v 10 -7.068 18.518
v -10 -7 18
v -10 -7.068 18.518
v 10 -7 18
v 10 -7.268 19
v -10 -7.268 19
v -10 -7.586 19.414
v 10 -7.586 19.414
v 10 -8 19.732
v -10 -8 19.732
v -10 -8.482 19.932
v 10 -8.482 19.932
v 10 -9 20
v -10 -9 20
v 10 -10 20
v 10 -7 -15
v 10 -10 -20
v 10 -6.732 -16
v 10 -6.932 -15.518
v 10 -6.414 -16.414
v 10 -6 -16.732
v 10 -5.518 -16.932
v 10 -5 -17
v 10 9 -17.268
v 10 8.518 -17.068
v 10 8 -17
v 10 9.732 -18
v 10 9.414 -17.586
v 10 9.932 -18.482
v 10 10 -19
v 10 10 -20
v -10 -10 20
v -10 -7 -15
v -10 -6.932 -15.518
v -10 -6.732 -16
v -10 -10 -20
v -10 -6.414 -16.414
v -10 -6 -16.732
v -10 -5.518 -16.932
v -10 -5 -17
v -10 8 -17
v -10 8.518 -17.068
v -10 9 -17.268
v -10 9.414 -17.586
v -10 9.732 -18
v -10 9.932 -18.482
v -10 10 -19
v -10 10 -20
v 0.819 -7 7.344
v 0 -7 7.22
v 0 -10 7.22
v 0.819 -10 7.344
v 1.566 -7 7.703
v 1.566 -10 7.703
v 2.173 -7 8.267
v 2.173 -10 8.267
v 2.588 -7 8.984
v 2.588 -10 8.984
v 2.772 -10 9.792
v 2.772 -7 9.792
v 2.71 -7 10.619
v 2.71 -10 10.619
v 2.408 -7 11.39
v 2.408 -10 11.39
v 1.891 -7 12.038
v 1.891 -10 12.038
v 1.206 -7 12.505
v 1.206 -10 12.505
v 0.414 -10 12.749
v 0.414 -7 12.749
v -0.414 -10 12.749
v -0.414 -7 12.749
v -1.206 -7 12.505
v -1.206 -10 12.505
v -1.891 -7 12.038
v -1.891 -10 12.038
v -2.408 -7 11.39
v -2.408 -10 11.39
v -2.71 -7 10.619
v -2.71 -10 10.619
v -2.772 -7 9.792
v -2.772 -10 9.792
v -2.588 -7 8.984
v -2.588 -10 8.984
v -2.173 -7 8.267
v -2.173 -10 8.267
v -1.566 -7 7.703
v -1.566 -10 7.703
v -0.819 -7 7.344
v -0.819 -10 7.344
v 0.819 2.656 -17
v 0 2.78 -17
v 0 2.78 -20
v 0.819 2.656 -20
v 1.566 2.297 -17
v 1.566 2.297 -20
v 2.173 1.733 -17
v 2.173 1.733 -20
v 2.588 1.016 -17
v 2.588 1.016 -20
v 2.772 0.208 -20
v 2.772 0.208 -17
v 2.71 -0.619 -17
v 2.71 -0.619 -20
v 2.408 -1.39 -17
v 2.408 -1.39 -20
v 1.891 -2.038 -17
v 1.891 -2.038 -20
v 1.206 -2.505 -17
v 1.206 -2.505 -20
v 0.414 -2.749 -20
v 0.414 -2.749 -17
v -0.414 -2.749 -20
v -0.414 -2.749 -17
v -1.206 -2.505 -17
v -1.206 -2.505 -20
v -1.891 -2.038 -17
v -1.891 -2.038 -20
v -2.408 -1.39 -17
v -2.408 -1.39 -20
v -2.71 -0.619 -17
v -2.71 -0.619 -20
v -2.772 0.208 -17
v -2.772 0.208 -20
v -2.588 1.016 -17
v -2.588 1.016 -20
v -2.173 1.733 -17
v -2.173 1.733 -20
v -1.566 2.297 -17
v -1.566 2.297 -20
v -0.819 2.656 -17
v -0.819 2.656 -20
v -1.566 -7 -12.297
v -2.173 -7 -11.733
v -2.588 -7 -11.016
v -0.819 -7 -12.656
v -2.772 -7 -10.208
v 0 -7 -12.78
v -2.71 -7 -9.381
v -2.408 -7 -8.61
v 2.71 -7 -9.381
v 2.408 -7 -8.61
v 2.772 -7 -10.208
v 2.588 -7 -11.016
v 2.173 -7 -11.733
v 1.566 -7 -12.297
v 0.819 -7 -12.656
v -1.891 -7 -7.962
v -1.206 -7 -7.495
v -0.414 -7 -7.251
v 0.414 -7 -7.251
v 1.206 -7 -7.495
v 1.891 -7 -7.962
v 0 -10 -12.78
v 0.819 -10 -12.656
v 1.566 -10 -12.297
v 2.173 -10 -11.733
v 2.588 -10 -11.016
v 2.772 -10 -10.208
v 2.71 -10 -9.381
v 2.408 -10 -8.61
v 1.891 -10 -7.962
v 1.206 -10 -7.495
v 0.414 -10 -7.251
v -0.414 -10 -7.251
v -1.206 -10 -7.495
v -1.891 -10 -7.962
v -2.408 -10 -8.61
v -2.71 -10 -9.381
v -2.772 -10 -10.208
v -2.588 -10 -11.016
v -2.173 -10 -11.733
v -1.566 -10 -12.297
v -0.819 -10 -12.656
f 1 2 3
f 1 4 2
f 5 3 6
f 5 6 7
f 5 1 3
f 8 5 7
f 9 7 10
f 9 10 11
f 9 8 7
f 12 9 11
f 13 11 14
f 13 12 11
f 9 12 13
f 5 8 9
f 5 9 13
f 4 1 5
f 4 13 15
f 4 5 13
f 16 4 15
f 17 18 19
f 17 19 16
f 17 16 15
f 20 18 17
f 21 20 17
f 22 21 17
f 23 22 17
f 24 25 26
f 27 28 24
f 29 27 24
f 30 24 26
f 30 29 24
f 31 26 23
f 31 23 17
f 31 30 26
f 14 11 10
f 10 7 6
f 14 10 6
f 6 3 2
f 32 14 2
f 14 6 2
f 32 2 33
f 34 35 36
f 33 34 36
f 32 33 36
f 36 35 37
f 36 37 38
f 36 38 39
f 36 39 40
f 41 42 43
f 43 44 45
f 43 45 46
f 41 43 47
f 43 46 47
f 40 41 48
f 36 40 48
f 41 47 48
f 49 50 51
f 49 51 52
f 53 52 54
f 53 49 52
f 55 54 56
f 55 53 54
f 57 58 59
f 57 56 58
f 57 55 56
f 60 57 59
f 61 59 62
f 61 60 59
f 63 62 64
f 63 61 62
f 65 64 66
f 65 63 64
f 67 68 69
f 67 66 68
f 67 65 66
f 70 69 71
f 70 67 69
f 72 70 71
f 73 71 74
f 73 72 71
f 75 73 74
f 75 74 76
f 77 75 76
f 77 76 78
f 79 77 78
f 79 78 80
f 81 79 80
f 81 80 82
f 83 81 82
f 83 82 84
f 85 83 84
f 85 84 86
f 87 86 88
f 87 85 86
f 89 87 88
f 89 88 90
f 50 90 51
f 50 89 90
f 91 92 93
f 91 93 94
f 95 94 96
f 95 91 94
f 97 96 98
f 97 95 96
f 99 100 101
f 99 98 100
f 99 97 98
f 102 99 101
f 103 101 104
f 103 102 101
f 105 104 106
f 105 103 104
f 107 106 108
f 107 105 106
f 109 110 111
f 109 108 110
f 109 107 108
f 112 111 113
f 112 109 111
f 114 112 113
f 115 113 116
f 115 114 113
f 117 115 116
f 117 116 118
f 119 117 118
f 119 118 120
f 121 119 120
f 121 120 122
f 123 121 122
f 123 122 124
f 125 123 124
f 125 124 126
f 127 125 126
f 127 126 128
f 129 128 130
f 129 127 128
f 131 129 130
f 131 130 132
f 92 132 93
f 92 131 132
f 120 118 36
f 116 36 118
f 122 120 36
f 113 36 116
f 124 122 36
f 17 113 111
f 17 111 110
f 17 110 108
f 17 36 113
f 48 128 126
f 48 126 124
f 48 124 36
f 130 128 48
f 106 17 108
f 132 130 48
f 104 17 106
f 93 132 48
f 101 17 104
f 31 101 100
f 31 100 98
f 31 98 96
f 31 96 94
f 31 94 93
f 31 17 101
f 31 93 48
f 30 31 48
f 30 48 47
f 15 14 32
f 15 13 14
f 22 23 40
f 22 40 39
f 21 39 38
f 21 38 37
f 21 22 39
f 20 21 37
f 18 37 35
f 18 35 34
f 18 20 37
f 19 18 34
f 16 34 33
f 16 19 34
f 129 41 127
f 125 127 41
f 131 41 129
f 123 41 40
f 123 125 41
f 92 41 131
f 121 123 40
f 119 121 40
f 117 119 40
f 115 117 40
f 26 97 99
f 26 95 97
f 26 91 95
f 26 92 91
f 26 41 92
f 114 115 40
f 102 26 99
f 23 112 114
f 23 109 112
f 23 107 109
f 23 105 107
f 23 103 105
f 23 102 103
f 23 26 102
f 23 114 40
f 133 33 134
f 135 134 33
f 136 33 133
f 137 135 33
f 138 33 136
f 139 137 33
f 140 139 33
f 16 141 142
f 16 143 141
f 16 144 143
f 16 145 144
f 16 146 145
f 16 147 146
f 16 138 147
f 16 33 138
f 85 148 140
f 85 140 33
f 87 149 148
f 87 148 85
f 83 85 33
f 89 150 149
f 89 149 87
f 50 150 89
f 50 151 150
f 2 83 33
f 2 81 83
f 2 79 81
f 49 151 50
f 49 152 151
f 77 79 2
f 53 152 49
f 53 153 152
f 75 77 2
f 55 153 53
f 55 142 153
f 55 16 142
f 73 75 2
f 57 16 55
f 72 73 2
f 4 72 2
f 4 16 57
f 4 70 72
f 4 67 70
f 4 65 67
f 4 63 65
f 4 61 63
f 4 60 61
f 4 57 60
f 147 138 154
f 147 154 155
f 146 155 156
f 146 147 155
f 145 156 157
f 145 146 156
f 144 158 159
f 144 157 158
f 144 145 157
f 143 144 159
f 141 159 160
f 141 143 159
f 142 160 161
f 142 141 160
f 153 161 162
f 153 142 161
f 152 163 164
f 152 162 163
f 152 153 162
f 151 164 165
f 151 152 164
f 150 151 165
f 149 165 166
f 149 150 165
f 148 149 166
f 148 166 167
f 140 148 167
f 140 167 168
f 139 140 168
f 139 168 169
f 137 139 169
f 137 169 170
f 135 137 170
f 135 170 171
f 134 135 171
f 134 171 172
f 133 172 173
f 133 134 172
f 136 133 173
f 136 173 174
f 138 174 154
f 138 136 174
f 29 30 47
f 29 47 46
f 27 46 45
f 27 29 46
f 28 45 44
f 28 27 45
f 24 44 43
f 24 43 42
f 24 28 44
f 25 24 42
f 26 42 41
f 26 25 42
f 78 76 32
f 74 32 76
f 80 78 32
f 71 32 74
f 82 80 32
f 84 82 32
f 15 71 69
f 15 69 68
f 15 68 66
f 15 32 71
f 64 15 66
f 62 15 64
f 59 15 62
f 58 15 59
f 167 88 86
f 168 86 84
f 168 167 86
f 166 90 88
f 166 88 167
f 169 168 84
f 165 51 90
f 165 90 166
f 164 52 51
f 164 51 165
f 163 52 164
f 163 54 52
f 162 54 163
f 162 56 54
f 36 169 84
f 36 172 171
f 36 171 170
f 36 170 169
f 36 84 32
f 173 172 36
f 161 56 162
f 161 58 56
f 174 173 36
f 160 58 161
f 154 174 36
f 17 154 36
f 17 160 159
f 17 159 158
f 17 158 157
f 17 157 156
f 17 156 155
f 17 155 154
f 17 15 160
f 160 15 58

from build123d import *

# Parameters (mm, degrees)
BOSS_EXTRUDE1_DEPTH     = 10
CUT_EXTRUDE1_DEPTH      = 43.426406871
CUT_EXTRUDE1_DEPTH_BACK = 43.426406871
SKETCH2_R               = 2.78
CUT_EXTRUDE2_DEPTH      = 31
CUT_EXTRUDE2_DEPTH_BACK = 31
SKETCH3_R               = 2.78


with BuildPart() as part:
    # Sketch1 → Boss-Extrude1 (new, symmetric)
    with BuildSketch(Plane(origin=(0, 0, 0), x_dir=(0, 0, -1), z_dir=(1, 0, 0))):
        with BuildLine():
            Line((-20, -10), (20, -10))
            Line((20, -10), (20, 10))
            Line((20, 10), (19, 10))
            ThreePointArc((19, 10), (17.585786438, 9.414213562), (17, 8))
            Line((17, 8), (17, -5))
            ThreePointArc((17, -5), (16.414213562, -6.414213562), (15, -7))
            Line((15, -7), (-18, -7))
            ThreePointArc((-18, -7), (-19.414213562, -7.585786438), (-20, -9))
            Line((-20, -9), (-20, -10))
        make_face()
    extrude(amount=BOSS_EXTRUDE1_DEPTH, both=True)

    # Sketch2 → Cut-Extrude1 (cut, two sides: drawn at the far end of the back side and taken through both)
    with BuildSketch(Plane(origin=(0, 0, -20), x_dir=(-1, 0, 0), z_dir=(0, 0, -1)).offset(-CUT_EXTRUDE1_DEPTH_BACK)):
        with Locations(Location((0, 0, 0), (0, 0, 90))):
            Circle(SKETCH2_R)
    extrude(amount=CUT_EXTRUDE1_DEPTH + CUT_EXTRUDE1_DEPTH_BACK, mode=Mode.SUBTRACT)

    # Sketch3 → Cut-Extrude2 (cut, two sides: drawn at the far end of the back side and taken through both)
    with BuildSketch(Plane.XZ.offset(10).offset(-CUT_EXTRUDE2_DEPTH_BACK)):
        with Locations(Location((0, 10, 0), (0, 0, 270))):
            Circle(SKETCH3_R)
        with Locations(Location((0, -10, 0), (0, 0, 270))):
            Circle(SKETCH3_R)
    extrude(amount=CUT_EXTRUDE2_DEPTH + CUT_EXTRUDE2_DEPTH_BACK, mode=Mode.SUBTRACT)


solid = part.part
